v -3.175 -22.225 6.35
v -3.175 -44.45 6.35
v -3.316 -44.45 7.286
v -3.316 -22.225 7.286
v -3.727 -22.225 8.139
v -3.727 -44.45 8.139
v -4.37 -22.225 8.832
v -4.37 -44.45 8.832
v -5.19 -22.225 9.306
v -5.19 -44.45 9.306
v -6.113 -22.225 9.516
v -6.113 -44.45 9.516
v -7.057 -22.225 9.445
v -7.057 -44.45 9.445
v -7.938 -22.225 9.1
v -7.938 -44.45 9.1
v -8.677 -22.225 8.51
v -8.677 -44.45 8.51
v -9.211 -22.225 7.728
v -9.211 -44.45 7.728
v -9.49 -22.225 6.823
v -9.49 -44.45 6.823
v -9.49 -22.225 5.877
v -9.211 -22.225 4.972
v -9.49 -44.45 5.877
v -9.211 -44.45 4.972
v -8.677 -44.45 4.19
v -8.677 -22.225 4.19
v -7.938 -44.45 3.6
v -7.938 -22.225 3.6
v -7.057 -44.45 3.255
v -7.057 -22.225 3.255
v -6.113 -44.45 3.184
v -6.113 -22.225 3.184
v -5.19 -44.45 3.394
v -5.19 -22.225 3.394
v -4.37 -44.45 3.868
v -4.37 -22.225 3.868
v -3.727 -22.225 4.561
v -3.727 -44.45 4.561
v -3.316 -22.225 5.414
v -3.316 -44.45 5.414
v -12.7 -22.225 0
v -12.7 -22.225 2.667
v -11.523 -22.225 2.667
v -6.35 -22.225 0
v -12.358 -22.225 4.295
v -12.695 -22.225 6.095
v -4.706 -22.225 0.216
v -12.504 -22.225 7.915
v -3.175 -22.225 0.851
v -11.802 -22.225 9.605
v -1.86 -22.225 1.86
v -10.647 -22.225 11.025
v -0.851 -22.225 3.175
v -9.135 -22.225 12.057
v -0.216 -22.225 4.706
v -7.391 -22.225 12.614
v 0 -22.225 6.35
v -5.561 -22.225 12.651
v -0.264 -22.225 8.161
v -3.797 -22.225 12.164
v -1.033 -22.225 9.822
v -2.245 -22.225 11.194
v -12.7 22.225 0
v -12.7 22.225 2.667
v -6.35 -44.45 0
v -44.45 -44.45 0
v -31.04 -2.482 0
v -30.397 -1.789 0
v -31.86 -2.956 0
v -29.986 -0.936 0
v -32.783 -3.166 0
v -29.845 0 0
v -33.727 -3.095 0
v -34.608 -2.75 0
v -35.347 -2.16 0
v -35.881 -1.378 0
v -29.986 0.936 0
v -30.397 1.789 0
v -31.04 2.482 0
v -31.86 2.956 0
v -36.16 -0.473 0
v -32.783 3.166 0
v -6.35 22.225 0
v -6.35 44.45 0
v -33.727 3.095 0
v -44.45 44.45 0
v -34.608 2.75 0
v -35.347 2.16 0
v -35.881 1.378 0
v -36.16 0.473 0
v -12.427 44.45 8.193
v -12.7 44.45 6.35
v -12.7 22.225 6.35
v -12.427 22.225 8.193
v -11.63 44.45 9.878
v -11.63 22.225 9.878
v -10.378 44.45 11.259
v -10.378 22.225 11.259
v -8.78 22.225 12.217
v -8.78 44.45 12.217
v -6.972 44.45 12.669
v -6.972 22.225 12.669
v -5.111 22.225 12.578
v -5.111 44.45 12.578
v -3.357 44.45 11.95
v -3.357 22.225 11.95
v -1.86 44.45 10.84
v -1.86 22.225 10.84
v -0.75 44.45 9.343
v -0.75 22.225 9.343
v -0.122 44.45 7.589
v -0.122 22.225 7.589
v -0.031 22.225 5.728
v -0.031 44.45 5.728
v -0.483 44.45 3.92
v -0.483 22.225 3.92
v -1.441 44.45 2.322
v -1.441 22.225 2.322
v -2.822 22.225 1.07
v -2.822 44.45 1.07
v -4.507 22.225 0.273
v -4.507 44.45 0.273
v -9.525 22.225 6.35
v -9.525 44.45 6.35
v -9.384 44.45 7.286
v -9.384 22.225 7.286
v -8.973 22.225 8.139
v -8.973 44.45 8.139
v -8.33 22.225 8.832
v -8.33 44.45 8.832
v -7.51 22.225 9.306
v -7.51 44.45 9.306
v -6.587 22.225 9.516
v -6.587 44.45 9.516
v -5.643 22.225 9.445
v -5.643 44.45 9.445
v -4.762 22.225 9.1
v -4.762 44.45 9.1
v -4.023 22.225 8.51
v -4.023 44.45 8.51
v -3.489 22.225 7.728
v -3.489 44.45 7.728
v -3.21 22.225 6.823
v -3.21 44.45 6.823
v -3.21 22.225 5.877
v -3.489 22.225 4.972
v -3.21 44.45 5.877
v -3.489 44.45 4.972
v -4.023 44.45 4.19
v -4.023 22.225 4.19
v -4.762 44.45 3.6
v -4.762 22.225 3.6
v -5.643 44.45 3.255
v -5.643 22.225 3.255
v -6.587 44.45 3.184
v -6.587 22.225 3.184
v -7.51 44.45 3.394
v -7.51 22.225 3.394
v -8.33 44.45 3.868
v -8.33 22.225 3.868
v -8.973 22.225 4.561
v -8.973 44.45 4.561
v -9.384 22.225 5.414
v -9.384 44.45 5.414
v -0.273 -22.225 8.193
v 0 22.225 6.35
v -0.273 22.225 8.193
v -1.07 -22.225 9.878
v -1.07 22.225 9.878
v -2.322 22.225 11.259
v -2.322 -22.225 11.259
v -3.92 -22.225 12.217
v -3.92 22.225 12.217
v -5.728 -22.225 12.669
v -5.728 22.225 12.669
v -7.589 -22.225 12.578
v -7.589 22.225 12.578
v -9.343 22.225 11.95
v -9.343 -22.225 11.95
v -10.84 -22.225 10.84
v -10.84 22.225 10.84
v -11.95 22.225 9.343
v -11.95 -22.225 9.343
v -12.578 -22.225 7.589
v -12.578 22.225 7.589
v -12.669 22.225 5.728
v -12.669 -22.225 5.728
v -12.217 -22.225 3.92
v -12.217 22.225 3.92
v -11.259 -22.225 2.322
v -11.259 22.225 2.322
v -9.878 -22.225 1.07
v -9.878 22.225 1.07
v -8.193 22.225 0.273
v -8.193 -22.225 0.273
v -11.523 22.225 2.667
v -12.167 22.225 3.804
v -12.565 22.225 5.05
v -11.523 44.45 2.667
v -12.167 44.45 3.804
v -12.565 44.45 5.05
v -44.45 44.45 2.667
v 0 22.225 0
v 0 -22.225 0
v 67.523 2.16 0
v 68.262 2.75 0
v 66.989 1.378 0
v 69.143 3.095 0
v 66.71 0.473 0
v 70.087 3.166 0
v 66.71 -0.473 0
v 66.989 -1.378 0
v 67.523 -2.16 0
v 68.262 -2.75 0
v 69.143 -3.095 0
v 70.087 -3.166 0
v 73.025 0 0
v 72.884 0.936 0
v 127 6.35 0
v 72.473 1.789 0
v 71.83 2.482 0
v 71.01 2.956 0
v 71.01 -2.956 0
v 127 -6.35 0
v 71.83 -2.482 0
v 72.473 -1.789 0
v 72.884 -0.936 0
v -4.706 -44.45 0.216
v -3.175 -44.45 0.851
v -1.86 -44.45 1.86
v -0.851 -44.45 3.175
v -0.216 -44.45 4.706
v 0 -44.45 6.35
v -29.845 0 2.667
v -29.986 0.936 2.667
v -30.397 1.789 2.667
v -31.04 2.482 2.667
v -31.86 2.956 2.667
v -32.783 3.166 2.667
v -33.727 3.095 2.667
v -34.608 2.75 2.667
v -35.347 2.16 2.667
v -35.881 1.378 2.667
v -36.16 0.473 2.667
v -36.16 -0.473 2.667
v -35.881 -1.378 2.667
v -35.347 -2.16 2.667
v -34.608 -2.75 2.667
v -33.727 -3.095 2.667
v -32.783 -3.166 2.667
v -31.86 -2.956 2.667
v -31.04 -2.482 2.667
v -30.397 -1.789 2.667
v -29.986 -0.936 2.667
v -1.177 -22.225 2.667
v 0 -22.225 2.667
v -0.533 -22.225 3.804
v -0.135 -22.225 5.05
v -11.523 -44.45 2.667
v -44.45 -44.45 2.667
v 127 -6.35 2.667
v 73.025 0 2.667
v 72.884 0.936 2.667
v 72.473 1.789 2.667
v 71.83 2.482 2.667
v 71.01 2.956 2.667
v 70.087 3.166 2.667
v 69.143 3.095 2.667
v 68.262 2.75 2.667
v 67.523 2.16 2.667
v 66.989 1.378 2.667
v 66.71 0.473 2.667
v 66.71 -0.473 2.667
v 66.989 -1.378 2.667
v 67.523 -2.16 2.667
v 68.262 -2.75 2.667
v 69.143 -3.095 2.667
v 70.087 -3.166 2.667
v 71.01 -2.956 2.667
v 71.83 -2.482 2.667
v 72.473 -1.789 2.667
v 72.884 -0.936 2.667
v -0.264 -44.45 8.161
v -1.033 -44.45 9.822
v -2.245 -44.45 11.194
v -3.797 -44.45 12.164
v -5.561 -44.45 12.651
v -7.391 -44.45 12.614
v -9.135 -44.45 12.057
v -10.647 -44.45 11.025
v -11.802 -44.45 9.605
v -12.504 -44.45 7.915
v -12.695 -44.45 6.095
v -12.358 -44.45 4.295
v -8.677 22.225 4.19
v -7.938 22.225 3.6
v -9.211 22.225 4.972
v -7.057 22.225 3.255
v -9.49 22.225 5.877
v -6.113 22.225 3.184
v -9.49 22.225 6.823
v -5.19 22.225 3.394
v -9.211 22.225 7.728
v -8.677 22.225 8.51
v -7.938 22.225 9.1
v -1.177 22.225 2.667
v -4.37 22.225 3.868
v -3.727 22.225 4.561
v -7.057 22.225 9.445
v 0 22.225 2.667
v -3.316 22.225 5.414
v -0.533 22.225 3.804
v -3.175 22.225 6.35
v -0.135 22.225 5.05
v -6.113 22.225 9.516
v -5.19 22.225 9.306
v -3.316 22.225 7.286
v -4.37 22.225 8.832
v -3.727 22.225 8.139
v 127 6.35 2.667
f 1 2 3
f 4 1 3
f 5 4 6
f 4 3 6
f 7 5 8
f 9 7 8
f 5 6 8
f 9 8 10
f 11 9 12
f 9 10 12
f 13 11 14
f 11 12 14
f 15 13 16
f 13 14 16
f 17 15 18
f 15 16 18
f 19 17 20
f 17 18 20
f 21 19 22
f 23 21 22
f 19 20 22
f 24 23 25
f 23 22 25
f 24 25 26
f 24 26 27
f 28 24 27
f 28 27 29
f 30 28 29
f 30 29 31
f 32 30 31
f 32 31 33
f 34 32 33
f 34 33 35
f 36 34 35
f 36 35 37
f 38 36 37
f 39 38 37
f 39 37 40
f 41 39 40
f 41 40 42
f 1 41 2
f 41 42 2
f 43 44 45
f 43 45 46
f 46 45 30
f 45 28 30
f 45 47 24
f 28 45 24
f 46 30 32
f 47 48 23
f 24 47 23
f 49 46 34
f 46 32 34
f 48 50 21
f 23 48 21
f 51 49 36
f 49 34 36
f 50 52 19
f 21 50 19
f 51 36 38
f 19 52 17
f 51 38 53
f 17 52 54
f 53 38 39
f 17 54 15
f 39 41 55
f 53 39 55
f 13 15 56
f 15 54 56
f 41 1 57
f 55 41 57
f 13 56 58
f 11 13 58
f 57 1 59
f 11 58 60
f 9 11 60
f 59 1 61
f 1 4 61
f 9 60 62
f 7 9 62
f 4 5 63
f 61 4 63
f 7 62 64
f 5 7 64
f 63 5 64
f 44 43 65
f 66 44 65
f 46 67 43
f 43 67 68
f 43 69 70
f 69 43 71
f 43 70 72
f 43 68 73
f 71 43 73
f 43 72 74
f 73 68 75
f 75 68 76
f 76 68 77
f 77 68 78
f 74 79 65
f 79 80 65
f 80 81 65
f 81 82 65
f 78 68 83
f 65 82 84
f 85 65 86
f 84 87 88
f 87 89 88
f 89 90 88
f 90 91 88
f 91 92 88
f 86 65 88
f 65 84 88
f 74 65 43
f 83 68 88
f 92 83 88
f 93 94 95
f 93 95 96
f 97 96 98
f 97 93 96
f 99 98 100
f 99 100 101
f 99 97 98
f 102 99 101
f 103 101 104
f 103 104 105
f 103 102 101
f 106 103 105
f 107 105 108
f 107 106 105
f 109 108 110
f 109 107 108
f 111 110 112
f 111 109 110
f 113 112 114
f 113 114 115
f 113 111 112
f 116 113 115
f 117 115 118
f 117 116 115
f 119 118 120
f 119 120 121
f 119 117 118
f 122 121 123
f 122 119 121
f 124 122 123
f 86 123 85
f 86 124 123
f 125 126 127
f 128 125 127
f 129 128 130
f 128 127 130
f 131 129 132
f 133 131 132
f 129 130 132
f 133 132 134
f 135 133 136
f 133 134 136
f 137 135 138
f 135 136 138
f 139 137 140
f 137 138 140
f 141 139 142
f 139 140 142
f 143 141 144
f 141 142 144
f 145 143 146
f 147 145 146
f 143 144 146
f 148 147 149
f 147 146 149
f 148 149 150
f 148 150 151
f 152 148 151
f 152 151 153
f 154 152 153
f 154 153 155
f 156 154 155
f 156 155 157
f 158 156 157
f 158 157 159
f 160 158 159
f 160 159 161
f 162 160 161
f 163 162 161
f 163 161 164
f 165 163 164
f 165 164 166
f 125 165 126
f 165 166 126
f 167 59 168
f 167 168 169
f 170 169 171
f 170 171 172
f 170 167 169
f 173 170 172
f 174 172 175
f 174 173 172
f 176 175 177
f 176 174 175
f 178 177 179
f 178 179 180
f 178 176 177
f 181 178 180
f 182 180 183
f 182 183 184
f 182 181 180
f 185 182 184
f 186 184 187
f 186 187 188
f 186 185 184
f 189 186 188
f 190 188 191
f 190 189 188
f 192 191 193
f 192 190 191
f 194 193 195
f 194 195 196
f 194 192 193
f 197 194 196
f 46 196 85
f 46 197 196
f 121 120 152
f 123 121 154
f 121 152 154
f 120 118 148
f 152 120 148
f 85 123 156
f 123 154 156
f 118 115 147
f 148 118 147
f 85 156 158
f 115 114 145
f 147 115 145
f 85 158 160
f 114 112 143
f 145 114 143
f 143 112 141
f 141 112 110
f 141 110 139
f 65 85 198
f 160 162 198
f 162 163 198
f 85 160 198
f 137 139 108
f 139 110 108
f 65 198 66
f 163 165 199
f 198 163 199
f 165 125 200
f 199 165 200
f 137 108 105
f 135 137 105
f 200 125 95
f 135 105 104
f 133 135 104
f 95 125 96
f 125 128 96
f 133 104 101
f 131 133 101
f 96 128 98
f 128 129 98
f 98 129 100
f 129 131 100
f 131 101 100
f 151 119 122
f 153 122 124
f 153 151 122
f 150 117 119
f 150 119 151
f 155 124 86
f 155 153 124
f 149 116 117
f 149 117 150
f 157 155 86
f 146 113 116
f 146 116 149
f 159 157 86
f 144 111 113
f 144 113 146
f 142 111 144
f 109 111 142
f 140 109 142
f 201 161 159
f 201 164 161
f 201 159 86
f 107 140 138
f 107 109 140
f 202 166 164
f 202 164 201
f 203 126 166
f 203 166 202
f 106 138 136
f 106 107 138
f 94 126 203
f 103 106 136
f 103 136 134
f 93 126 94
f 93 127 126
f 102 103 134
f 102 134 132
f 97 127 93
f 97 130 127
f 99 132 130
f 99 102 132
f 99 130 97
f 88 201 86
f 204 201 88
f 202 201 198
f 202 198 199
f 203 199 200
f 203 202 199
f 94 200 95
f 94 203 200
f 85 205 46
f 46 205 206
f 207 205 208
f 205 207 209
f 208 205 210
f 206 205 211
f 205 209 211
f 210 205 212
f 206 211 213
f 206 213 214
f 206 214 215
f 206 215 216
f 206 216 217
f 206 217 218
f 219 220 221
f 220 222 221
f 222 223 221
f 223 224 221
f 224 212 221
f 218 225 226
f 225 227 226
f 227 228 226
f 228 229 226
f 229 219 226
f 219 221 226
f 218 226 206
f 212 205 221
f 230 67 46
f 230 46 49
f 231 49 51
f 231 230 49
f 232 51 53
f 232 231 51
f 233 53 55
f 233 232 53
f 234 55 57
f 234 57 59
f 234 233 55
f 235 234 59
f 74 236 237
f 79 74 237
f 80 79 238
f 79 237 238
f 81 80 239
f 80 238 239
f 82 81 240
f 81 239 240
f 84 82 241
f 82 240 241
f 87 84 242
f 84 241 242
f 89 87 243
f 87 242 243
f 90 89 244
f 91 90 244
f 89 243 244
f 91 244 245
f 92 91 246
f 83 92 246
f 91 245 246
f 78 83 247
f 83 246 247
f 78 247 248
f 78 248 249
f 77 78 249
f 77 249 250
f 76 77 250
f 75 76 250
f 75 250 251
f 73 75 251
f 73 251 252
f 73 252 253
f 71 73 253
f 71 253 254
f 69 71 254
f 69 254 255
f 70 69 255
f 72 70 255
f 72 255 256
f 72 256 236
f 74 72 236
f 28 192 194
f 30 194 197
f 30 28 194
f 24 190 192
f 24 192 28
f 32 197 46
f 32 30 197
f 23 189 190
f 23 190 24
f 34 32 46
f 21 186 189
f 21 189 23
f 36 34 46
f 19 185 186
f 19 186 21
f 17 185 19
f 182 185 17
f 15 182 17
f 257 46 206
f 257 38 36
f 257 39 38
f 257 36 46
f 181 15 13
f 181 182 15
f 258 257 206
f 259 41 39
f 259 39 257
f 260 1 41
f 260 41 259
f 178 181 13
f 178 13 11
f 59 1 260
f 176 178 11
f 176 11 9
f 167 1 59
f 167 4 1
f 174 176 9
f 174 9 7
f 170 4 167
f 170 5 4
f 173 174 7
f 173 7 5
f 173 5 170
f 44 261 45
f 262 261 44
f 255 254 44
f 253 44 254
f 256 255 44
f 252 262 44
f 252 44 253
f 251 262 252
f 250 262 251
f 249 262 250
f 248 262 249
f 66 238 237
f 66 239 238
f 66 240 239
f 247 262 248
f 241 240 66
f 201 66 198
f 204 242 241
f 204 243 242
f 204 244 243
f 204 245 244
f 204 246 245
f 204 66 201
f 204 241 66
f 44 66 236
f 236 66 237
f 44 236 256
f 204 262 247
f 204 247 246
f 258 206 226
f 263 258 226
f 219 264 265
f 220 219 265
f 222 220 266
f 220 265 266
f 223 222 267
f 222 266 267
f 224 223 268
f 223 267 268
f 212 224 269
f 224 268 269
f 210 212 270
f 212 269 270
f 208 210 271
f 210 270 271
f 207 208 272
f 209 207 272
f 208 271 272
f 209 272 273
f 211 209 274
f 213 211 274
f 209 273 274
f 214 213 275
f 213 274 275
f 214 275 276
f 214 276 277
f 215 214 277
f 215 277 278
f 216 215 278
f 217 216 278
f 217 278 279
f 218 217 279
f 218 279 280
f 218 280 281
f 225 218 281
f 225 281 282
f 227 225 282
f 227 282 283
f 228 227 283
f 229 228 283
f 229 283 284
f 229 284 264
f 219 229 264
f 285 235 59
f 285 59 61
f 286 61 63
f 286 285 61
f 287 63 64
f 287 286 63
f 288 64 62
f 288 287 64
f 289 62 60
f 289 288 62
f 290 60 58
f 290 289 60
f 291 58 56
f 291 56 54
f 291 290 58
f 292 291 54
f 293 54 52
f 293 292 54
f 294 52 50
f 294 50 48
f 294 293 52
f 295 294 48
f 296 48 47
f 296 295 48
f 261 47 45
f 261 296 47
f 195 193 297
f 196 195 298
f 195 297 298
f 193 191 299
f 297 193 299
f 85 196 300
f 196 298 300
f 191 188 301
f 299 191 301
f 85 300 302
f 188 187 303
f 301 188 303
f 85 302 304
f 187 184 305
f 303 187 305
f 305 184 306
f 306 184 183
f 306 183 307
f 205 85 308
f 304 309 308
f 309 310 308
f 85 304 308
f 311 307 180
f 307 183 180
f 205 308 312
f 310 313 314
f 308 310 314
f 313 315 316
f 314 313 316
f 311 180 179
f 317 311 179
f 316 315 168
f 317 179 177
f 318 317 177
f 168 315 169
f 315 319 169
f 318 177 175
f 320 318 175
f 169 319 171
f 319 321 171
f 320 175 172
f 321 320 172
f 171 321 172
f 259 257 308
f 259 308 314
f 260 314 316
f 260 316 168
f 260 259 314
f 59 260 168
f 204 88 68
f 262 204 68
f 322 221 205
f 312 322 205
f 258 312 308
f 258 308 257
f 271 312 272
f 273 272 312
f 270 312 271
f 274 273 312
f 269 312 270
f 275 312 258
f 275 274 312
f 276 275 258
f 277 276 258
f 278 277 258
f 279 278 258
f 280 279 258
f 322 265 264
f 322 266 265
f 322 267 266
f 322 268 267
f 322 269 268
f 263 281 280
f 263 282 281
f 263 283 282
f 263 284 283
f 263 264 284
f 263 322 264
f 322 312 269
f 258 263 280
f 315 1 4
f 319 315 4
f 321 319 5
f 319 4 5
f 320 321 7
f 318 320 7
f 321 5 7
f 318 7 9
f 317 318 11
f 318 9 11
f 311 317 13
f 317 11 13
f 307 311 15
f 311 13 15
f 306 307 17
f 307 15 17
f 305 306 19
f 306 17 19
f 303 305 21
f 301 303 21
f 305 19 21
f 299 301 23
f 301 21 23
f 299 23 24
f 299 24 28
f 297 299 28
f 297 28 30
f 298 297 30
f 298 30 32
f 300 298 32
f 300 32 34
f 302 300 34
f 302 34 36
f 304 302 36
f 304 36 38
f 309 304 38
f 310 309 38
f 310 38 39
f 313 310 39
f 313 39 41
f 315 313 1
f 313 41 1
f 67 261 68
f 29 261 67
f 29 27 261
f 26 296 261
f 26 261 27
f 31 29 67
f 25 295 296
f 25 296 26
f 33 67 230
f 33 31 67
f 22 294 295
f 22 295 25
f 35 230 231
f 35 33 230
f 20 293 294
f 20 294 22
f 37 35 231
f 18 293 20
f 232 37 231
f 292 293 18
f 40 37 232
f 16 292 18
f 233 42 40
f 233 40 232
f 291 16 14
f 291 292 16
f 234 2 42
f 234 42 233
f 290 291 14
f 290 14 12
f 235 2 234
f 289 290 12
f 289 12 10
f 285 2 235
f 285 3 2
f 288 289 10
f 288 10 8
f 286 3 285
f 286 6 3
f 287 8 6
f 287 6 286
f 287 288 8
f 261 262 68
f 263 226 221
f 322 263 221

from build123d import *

# Parameters (mm, degrees)
F1_DEPTH  = 2.667
F2_DEPTH  = 6.35
F4_DEPTH  = 44.45
F5_R      = 3.175
F6_DEPTH  = 44.45
F8_DEPTH  = 2.667
F9_W      = 22.225
F9_H      = 2.667
F10_DEPTH = 6.35
F11_R     = 3.175
F12_DEPTH = 22.225
F13_R     = 3.175
F14_DEPTH = 22.225
F15_R     = 3.175
F16_DEPTH = 25.4
F17_R     = 3.175
F18_DEPTH = 25.4


with BuildPart() as f1:
    # F0 (on Top) → F1 (new body)
    with BuildSketch(Plane.XY):
        Polygon((127, 6.35), (0, 22.225), (0, -22.225), (127, -6.35), align=None)
    extrude(amount=F1_DEPTH)

    # F2 (add): a face of the model
    f2_faces = [f1.faces().sort_by_distance(p)[0] for p in [
        (0, 0, 1.3335),
    ]]
    extrude(f2_faces, amount=F2_DEPTH)

    # F3 (on face) → F4 (join, through all)
    with BuildSketch(Plane.XZ.offset(22.225)):
        with BuildLine():
            ThreePointArc((-1.177185389, 2.667), (-0.3014517122, 4.4167220557), (0, 6.35))
            ThreePointArc((0, 6.35), (-10.8401280605, 10.8401280605), (-6.35, 0))
            Line((-6.35, 0), (-6.35, 2.667))
            Line((-6.35, 2.667), (-1.177185389, 2.667))
        make_face()
    extrude(amount=-F4_DEPTH)

    # F5 (on face) → F6 (cut, through all)
    with BuildSketch(Plane.XZ.offset(22.225)):
        with Locations((-6.35, 6.35)):
            Circle(F5_R)
    extrude(amount=-F6_DEPTH, mode=Mode.SUBTRACT)

    # F17 (on face) → F18 (cut)
    with BuildSketch(Plane.XY.offset(2.667)):
        with Locations((69.85, 0)):
            Circle(F17_R)
    extrude(amount=-F18_DEPTH, mode=Mode.SUBTRACT)


with BuildPart() as f8:
    # F7 (on Top) → F8 (new body)
    with BuildSketch(Plane.XY):
        Polygon((-12.7, -44.45), (-12.7, -38.1), (-12.7, 38.1), (-12.7, 44.45), (-44.45, 44.45), (-44.45, -44.45), align=None)
    extrude(amount=F8_DEPTH)

    # F9 (on face) → F10 (join)
    with BuildSketch(Plane.YZ.offset(-12.7)):
        with Locations((-33.3375, 1.3335)):
            Rectangle(F9_W, F9_H)
        with Locations((33.3375, 1.3335)):
            Rectangle(F9_W, F9_H)
    extrude(amount=F10_DEPTH)

    # F11 (on face) → F12 (join, through all)
    with BuildSketch(Plane.XZ.offset(44.45)):
        with BuildLine():
            Line((-6.35, 2.667), (-6.35, 0))
            ThreePointArc((-6.35, 0), (-1.8598719395, 1.8598719395), (0, 6.35))
            ThreePointArc((0, 6.35), (-8.2832779443, 12.3985482878), (-11.522814611, 2.667))
            Line((-11.522814611, 2.667), (-6.35, 2.667))
        make_face()
        with Locations((-6.35, 6.35)):
            Circle(F11_R, mode=Mode.SUBTRACT)
    extrude(amount=-F12_DEPTH)

    # F13 (on face) → F14 (join, through all)
    with BuildSketch(Plane(origin=(0, 44.45, 0), x_dir=(-1, 0, 0), z_dir=(0, 1, 0))):
        with BuildLine():
            ThreePointArc((11.522814611, 2.667), (12.3985482878, 4.4167220557), (12.7, 6.35))
            ThreePointArc((12.7, 6.35), (1.8598719395, 10.8401280605), (6.35, 0))
            Line((6.35, 0), (6.35, 2.667))
            Line((6.35, 2.667), (11.522814611, 2.667))
        make_face()
        with Locations((6.35, 6.35)):
            Circle(F13_R, mode=Mode.SUBTRACT)
    extrude(amount=-F14_DEPTH)

    # F15 (on face) → F16 (cut)
    with BuildSketch(Plane.XY.offset(2.667)):
        with Locations((-33.02, 0)):
            Circle(F15_R)
    extrude(amount=-F16_DEPTH, mode=Mode.SUBTRACT)


solid = Compound([f1.part, f8.part])
